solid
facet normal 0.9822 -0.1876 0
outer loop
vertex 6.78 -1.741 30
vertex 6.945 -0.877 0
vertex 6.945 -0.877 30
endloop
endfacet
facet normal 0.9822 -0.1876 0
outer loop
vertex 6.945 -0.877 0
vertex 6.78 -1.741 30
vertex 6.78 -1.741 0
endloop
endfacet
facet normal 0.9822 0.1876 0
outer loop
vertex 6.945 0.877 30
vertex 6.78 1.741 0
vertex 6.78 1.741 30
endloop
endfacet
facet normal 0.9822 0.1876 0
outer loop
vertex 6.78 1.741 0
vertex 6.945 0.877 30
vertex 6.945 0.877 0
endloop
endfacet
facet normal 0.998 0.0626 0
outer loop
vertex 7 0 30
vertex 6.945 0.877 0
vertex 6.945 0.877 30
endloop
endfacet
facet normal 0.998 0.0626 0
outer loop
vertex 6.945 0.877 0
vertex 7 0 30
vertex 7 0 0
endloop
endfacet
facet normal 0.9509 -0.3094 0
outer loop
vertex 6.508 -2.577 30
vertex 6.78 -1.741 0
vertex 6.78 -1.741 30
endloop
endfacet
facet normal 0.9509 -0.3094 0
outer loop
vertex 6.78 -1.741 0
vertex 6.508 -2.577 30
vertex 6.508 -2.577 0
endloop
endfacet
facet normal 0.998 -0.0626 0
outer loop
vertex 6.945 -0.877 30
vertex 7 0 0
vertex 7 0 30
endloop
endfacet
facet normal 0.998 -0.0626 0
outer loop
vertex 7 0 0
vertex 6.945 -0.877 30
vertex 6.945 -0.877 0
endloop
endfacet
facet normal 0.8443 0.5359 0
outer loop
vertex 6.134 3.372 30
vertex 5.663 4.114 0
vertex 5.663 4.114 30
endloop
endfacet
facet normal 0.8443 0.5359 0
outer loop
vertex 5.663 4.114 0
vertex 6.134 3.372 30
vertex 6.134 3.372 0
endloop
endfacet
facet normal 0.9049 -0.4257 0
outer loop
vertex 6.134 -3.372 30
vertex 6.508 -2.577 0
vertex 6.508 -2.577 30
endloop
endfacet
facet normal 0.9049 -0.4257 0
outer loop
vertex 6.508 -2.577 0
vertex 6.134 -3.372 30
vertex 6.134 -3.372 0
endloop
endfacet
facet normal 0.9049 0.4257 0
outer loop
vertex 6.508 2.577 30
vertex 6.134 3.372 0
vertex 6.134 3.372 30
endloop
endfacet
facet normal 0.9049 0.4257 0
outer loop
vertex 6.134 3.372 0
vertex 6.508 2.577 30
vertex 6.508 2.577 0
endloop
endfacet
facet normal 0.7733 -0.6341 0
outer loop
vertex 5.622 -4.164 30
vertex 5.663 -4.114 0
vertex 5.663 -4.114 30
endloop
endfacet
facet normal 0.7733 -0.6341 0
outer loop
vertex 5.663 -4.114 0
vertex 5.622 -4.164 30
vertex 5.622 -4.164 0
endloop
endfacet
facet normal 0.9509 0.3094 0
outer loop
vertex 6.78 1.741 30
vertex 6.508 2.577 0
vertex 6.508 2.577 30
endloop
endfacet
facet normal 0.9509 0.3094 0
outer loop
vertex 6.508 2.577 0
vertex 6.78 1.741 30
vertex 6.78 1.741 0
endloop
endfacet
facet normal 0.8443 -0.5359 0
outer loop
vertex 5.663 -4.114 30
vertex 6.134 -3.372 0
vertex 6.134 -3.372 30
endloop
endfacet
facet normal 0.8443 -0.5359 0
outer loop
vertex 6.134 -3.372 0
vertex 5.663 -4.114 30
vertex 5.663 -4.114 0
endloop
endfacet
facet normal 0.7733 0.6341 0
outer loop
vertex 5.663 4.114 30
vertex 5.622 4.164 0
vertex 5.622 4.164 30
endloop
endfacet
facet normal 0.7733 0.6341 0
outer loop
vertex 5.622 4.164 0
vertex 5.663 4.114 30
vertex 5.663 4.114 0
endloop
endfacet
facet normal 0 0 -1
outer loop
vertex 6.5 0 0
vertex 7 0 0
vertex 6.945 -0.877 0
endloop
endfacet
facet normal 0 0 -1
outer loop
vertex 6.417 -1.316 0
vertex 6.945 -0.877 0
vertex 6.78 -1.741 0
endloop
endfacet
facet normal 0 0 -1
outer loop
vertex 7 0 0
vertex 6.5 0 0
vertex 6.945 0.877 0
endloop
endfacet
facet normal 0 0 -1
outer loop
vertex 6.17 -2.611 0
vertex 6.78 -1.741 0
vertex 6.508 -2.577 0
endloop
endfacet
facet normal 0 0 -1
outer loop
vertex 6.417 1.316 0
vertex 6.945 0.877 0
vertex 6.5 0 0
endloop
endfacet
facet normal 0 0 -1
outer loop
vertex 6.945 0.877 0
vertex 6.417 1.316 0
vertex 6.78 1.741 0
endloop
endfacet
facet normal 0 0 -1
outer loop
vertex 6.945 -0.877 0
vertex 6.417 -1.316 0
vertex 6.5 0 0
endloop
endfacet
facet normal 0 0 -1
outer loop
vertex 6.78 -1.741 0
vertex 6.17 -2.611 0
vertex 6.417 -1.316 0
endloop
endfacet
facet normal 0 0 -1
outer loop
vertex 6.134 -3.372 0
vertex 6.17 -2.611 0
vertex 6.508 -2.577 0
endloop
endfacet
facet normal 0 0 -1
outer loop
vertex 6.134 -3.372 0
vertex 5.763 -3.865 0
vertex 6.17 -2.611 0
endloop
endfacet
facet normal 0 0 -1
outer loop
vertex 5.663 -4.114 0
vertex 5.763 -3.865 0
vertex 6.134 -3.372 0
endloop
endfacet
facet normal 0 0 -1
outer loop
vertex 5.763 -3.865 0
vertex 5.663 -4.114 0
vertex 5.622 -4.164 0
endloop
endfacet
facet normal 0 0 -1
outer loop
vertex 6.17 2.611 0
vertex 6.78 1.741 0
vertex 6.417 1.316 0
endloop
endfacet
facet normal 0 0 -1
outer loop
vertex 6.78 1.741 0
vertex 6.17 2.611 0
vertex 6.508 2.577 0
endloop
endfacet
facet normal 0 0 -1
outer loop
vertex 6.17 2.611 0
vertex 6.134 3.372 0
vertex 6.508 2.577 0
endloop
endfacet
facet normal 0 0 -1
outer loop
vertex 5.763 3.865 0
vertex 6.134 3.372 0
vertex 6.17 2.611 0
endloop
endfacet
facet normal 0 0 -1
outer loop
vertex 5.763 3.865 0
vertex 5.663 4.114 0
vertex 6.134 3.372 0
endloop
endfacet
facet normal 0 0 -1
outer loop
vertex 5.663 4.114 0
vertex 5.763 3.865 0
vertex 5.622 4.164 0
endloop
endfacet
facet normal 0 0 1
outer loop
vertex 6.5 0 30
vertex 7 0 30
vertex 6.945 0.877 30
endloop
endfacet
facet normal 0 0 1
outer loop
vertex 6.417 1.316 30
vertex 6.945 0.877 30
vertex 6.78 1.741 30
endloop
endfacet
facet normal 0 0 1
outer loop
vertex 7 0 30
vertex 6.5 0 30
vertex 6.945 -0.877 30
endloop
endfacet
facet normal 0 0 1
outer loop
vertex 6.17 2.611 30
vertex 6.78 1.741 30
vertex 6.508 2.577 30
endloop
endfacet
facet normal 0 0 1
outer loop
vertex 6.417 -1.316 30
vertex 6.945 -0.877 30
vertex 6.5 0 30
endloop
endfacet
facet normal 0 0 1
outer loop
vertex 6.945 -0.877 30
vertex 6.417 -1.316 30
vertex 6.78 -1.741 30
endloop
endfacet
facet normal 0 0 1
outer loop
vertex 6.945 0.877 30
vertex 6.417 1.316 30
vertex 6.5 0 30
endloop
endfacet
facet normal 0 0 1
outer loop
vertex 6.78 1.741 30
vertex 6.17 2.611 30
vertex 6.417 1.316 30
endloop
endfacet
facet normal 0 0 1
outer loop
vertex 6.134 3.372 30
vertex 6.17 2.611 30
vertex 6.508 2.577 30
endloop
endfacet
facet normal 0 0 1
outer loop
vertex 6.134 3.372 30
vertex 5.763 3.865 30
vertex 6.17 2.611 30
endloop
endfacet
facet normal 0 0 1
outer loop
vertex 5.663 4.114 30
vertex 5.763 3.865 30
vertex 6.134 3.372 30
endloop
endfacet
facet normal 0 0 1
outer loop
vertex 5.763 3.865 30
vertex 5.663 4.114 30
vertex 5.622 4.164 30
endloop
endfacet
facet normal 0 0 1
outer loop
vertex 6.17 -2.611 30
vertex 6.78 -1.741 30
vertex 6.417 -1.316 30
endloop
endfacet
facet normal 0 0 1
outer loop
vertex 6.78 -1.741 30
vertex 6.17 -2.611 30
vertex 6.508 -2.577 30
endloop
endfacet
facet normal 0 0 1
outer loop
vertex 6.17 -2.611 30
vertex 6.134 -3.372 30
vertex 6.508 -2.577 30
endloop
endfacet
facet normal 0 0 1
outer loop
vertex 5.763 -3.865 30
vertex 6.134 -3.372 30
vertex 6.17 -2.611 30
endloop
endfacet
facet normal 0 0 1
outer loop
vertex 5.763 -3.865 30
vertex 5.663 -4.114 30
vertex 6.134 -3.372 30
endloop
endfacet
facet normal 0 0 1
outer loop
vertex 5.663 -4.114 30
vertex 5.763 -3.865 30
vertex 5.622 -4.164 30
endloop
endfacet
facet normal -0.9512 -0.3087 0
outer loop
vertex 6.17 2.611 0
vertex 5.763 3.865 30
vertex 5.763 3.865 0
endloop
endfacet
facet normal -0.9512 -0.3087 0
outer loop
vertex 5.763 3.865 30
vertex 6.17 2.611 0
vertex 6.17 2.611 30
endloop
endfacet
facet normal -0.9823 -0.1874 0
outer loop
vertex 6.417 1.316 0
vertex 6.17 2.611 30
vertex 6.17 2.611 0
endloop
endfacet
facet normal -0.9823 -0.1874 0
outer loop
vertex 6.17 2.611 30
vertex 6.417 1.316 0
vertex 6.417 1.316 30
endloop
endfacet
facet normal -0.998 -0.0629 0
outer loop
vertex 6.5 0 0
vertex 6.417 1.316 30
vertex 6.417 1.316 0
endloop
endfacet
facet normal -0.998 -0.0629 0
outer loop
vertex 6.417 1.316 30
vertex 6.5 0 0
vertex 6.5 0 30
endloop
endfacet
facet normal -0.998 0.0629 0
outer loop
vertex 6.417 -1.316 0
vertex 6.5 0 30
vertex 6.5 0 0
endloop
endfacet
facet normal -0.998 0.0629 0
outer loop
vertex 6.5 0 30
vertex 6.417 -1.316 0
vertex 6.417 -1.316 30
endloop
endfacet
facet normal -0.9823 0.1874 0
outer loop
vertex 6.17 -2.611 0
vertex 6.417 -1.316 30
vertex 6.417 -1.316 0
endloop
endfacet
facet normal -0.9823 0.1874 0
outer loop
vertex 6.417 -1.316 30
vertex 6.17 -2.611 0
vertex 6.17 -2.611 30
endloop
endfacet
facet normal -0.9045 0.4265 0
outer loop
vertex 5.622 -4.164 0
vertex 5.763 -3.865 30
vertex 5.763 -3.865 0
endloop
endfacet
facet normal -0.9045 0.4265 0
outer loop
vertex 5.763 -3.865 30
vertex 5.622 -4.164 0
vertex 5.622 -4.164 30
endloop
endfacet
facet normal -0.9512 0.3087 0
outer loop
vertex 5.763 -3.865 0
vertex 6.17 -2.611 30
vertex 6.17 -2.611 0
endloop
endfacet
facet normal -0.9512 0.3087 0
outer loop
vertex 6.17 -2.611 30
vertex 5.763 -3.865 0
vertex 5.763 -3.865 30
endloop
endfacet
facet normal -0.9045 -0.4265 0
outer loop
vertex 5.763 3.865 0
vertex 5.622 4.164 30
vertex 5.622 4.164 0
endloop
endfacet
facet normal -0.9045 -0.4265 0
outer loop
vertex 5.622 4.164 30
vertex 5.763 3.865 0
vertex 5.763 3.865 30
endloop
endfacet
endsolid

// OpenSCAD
$fn = 50;


difference() {
	union() {
		cylinder(h = 30, r = 7.0000000000);
		translate(v = [-7.0000000000, 0, 0]) {
			cylinder(h = 30, r = 7.0000000000);
		}
	}
	union() {
		cylinder(h = 30, r = 3.2500000000);
		cylinder(h = 30, r = 1.8000000000);
		cylinder(h = 30, r = 1.8000000000);
		cylinder(h = 30, r = 1.8000000000);
		translate(v = [-11.5000000000, 0, 0]) {
			hull() {
				translate(v = [-3.7500000000, 0.0000000000, 0]) {
					cylinder(h = 30, r = 10.5000000000);
				}
				translate(v = [3.7500000000, 0.0000000000, 0]) {
					cylinder(h = 30, r = 10.5000000000);
				}
				translate(v = [-3.7500000000, -0.0000000000, 0]) {
					cylinder(h = 30, r = 10.5000000000);
				}
				translate(v = [3.7500000000, -0.0000000000, 0]) {
					cylinder(h = 30, r = 10.5000000000);
				}
			}
		}
		translate(v = [-4.0000000000, 0, 0.0000000000]) {
			cylinder(h = 30, r = 10.5000000000);
		}
	}
}
